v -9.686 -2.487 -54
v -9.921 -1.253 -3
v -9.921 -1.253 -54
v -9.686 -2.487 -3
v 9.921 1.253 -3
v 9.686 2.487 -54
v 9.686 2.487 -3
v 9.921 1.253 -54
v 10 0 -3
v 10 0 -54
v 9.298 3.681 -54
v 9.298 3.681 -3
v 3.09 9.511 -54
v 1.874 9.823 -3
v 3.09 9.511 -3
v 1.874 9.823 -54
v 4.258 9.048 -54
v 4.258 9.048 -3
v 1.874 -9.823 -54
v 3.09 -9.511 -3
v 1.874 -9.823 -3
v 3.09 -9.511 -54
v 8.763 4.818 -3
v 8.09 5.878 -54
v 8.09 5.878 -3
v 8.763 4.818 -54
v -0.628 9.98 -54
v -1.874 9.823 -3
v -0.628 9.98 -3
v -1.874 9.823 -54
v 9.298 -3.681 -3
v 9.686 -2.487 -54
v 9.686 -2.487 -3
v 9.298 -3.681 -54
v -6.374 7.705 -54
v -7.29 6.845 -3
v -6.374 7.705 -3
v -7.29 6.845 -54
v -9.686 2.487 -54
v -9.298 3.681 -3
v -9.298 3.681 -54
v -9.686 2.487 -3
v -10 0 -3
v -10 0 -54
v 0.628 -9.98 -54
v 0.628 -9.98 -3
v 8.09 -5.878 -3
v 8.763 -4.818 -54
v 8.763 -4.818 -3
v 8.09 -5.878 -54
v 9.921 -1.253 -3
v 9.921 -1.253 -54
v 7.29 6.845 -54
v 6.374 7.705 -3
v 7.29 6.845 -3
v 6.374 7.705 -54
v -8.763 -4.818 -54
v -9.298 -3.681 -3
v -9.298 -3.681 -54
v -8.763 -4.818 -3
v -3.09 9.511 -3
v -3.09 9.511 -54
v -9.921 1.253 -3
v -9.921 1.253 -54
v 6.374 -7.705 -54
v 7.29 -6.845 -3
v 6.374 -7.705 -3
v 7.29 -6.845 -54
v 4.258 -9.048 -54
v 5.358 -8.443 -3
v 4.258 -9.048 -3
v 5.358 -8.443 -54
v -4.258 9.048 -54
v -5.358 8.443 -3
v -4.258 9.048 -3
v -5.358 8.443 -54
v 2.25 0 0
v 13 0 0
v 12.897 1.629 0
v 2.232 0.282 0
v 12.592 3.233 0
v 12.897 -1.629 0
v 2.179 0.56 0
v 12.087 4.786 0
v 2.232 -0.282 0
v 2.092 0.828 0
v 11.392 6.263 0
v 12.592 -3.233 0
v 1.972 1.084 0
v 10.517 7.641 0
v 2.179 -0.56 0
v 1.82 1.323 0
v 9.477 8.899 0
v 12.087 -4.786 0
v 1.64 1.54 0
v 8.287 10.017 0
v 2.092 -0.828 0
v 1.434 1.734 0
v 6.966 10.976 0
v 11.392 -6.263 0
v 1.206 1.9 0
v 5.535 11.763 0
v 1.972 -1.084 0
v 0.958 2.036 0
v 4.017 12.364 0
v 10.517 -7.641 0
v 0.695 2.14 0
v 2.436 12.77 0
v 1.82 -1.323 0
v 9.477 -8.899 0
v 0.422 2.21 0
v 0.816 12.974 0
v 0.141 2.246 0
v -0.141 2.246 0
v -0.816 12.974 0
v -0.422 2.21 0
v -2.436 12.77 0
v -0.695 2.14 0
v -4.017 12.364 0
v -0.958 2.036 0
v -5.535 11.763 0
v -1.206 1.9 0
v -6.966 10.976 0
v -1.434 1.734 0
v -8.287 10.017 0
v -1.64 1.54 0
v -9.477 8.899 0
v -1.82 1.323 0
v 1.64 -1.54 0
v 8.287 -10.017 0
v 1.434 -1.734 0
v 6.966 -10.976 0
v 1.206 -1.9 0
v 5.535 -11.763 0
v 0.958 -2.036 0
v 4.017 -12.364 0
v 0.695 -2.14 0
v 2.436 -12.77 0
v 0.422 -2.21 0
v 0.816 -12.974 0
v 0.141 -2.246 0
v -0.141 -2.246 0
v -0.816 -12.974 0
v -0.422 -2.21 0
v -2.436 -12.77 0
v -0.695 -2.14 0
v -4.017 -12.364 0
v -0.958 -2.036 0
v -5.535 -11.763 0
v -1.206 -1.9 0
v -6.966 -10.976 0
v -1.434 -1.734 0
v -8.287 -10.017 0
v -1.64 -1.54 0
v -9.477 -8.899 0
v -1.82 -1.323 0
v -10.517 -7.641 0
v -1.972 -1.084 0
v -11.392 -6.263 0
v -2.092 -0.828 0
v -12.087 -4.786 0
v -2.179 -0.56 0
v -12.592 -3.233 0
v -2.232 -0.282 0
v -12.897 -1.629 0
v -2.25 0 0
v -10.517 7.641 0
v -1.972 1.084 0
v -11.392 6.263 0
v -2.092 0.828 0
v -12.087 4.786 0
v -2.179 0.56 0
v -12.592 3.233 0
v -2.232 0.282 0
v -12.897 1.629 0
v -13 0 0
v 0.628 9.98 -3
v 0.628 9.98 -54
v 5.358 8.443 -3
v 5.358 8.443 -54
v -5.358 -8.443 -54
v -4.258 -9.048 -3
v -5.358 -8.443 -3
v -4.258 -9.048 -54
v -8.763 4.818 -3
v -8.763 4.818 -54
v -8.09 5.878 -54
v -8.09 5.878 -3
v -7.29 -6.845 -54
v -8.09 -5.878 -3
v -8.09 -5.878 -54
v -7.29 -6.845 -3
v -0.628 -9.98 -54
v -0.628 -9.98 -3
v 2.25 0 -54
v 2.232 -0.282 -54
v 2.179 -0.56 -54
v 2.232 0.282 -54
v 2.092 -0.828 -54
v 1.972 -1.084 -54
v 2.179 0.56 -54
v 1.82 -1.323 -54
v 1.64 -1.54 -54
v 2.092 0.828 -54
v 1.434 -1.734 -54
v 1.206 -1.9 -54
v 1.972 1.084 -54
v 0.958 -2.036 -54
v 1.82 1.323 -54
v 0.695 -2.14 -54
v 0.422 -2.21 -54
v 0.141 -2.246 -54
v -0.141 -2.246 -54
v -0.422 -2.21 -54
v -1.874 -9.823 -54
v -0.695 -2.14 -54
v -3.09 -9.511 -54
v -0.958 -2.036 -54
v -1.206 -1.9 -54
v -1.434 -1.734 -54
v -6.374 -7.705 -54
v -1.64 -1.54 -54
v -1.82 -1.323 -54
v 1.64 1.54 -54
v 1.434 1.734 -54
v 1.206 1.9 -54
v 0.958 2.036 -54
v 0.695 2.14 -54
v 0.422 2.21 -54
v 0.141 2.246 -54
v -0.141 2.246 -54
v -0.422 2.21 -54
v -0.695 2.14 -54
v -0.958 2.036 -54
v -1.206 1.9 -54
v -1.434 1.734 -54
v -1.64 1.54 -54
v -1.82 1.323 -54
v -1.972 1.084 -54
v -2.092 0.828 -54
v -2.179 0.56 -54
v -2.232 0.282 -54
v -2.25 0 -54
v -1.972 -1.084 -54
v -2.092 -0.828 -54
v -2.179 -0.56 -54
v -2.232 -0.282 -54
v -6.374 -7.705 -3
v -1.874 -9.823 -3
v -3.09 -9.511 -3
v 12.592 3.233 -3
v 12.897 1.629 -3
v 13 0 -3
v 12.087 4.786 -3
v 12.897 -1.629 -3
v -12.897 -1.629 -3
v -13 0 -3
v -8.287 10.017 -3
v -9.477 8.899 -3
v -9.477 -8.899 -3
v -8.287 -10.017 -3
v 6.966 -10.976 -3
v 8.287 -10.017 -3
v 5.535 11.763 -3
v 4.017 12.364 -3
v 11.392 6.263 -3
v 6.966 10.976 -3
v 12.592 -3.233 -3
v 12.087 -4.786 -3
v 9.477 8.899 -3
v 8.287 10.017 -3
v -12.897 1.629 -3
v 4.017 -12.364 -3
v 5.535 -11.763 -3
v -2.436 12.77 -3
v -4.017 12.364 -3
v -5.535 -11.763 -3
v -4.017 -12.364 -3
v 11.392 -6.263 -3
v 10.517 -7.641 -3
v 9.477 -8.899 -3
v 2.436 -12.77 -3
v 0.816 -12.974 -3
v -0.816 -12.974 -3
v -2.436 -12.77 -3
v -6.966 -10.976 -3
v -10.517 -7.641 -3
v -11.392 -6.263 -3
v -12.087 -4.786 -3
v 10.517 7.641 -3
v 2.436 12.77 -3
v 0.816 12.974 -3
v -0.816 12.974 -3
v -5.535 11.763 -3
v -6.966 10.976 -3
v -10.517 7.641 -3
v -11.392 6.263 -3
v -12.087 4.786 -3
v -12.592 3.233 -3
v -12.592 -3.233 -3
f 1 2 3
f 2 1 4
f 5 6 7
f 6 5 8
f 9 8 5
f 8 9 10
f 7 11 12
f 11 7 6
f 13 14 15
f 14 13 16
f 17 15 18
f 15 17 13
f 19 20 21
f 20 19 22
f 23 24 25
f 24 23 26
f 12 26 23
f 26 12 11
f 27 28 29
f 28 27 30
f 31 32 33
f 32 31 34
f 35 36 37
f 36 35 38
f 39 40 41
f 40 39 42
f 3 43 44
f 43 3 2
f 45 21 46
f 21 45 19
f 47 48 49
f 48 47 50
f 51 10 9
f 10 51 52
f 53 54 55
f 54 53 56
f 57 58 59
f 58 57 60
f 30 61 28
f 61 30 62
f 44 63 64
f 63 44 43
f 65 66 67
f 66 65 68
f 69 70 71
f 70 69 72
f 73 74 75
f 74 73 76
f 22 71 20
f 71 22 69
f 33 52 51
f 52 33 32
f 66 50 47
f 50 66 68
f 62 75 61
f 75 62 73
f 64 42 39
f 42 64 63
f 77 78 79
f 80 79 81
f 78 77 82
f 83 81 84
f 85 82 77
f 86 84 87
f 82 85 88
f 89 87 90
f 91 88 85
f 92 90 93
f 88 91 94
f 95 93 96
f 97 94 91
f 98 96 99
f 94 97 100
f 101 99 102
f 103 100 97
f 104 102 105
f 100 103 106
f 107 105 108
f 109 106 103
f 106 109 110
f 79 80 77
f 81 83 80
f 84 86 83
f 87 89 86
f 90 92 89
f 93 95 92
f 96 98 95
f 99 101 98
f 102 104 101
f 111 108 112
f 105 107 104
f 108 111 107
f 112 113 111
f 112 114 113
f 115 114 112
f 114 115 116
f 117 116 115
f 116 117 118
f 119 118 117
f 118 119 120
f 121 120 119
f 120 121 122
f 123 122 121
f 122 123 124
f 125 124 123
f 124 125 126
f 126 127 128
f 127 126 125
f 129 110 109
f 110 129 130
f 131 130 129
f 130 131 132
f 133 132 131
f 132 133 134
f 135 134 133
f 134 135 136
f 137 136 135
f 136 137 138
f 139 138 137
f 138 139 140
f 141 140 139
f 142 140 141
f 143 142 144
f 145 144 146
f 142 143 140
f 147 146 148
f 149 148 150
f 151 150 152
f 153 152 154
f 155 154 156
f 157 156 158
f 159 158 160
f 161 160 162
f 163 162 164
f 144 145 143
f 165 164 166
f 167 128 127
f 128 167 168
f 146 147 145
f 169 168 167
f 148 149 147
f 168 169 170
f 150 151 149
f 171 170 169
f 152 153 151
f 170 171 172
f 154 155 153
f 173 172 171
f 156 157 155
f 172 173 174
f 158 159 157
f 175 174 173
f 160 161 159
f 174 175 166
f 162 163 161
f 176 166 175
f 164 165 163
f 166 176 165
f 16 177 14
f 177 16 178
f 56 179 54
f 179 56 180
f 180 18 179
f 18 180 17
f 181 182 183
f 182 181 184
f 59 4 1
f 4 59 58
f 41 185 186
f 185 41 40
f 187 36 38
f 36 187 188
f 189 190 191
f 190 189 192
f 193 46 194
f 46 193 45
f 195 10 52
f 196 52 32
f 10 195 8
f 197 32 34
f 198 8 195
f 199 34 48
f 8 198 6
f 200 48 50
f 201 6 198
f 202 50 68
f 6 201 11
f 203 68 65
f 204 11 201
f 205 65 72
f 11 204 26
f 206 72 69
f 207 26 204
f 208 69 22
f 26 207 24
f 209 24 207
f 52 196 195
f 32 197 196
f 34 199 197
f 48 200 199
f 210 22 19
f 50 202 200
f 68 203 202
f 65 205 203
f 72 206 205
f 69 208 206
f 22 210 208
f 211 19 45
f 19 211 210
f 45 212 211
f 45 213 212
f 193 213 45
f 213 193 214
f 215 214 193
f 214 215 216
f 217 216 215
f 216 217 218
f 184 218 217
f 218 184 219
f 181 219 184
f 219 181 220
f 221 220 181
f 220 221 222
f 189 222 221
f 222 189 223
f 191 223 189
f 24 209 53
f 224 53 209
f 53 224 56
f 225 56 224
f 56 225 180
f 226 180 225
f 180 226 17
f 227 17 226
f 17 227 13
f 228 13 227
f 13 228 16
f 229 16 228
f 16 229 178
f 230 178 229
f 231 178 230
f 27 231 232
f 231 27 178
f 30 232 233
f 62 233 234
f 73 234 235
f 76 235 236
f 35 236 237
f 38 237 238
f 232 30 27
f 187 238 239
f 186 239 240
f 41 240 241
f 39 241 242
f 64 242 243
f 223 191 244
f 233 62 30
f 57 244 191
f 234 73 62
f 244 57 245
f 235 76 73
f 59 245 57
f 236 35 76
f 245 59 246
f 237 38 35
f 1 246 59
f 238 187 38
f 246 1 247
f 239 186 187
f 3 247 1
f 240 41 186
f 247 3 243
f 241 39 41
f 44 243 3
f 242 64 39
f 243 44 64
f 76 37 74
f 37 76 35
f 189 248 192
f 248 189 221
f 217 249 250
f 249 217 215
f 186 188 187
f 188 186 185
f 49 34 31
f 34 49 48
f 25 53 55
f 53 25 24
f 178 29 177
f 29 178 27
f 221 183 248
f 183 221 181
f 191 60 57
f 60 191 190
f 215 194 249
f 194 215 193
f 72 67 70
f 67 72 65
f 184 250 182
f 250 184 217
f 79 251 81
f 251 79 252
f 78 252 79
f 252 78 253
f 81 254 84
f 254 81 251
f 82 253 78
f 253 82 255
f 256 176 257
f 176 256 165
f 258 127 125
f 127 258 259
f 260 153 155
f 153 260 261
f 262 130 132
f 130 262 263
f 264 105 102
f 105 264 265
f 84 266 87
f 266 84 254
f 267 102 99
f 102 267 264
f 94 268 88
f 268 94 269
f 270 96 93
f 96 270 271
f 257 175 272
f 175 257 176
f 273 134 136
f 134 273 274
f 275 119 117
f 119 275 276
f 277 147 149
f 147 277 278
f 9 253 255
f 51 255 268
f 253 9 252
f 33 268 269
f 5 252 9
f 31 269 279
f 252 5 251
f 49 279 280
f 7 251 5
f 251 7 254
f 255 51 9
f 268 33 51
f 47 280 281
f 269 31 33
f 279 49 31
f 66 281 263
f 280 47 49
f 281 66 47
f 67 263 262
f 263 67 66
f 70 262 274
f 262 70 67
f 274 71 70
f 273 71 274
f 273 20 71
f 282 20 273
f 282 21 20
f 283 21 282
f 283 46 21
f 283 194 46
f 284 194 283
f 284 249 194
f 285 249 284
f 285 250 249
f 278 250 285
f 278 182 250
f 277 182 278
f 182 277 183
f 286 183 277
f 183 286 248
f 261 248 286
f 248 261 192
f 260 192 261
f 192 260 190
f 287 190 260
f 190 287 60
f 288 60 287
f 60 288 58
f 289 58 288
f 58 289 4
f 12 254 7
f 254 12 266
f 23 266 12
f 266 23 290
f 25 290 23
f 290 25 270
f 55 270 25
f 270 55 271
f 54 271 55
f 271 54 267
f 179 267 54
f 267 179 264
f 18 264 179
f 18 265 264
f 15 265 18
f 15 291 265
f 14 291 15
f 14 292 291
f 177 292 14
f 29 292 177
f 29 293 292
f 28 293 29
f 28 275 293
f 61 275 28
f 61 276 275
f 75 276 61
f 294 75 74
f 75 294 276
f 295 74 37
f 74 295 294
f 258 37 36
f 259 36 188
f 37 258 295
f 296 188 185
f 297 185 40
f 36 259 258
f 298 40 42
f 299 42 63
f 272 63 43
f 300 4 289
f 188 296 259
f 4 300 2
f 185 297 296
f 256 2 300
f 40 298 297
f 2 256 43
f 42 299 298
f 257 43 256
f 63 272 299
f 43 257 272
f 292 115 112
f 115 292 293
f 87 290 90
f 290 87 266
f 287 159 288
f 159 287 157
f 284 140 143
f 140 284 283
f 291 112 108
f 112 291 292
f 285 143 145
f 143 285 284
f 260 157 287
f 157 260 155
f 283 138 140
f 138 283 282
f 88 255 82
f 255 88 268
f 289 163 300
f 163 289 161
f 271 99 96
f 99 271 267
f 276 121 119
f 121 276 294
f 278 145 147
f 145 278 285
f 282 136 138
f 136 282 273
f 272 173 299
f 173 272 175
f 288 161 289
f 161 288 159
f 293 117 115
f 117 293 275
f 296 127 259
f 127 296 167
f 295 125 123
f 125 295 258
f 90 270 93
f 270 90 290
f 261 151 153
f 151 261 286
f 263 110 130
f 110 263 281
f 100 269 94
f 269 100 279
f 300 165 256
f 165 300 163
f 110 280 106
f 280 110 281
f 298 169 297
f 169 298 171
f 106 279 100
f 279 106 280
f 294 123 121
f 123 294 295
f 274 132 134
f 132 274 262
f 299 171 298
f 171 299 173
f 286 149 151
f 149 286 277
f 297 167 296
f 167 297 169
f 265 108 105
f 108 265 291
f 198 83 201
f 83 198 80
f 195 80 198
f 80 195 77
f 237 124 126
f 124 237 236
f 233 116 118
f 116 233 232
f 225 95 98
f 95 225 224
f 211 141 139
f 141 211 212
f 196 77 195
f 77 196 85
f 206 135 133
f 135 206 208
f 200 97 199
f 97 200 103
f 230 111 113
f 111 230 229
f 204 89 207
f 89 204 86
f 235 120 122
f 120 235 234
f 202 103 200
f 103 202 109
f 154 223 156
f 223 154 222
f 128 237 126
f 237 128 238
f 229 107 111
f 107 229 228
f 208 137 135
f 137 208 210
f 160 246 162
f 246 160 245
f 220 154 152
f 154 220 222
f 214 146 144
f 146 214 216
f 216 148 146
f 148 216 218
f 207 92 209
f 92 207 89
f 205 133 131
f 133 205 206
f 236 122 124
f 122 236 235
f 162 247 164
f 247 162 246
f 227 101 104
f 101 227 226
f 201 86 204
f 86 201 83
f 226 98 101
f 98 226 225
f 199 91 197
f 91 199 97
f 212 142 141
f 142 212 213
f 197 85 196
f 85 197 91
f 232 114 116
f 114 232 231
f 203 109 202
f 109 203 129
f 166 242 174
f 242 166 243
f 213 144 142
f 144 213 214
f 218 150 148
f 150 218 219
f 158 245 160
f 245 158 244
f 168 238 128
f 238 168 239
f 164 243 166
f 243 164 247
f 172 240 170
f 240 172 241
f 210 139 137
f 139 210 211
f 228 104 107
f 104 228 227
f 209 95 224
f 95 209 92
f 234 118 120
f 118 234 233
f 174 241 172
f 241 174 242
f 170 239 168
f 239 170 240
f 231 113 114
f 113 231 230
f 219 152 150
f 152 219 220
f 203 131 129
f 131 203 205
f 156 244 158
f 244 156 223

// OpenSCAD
$fn = 50;


difference() {
	union() {
		translate(v = [0, 0, -54.0000000000]) {
			cylinder(h = 54, r = 10.0000000000);
		}
		translate(v = [0, 0, -3.0000000000]) {
			cylinder(h = 3, r = 13.0000000000);
		}
	}
	union() {
		#translate(v = [0, 0, -54]) {
			cylinder(h = 54, r = 2.2500000000);
		}
	}
}
